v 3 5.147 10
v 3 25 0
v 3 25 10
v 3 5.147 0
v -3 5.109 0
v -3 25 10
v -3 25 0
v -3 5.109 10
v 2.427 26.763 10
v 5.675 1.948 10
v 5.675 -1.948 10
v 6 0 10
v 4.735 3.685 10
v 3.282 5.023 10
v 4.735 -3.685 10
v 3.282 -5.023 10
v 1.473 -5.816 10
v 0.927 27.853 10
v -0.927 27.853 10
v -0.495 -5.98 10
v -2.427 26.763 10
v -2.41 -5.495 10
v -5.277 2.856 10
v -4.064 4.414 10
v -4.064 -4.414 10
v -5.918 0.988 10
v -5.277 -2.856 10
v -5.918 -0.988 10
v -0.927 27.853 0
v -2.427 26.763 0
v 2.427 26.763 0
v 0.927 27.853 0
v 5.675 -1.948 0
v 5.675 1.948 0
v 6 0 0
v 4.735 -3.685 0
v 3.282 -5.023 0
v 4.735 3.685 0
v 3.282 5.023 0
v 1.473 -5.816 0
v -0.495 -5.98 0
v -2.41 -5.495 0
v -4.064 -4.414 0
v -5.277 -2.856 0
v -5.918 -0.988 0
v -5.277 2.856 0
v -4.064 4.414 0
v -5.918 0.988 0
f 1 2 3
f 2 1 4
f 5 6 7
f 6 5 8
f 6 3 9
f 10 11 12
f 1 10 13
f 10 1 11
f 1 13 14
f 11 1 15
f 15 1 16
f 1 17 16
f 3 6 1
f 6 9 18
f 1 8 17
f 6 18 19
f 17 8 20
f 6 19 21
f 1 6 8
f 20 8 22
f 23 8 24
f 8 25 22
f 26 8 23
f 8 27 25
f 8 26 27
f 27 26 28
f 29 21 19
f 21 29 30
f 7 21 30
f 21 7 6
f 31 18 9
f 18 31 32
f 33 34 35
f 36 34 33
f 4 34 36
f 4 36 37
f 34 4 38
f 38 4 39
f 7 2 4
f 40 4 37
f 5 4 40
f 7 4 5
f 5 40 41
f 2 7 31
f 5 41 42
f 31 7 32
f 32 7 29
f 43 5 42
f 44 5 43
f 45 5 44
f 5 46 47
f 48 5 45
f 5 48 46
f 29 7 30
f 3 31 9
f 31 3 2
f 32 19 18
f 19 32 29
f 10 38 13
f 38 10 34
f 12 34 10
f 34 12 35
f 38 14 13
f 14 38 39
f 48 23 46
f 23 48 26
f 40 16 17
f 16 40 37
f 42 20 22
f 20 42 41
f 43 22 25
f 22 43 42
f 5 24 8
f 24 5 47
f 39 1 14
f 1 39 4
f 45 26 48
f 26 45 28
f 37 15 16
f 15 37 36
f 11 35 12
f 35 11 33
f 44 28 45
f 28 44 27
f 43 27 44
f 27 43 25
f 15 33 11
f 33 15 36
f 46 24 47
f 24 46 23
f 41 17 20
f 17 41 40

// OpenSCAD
// Function: translate_x()
// Usage: translate_x(dist)
// Description: 
//   Translate in the X direction.  Equivalent to `translate([dist, 0, 0])`.
module translate_x(x_tr){
    translate([x_tr, 0, 0]){
        children();
    }
}

// Function: translate_y()
// Usage: translate_y(dist)
// Description: 
//   Translate in the Y direction.  Equivalent to `translate([0, dist, 0])`.
module translate_y(y_tr){
    translate([0, y_tr, 0]){
        children();
    }
}

// Function: translate_z()
// Usage: translate_z(dist)
// Description: 
//   Translate in the Z direction.  Equivalent to `translate([0, 0, dist])`.
module translate_z(z_tr){
    translate([0, 0, z_tr]){
        children();
    }
}

// Function: rotate_x()
// Usage: rotate_x(angle)
// Description: Rotate about X axis. Equivalent to `rotate([angle, 0, 0])`.
module rotate_x(x_angle){
    rotate([x_angle, 0, 0]){
        children();
    }
}

// Function: rotate_y()
// Usage: rotate_y(angle)
// Description: Rotate about Y axis. Equivalent to `rotate([0, angle, 0])`.
module rotate_y(y_angle){
    rotate([0, y_angle, 0]){
        children();
    }
}

// Function: rotate_z()
// Usage: rotate_z(angle)
// Description: Rotate about Z axis. Equivalent to `rotate([0, 0, angle])`.
module rotate_z(z_angle){
    rotate([0, 0, z_angle]){
        children();
    }
}

// Function: reflect()
// Usage: reflect(axis)
// Arguments:
//   axis = a 2- or 3D vector giving the axis to reflect in
// Description:
//   Duplicate the children of this module, once unmodified, and
//   once mirrored about the specified axis.  The mirrored copy
//   is equivalent to `mirror(axis) children()`.
//   
//   Conveninece functions `reflect_x`, `reflect_y`, and `reflect_z`
//   are defined to reflect about the respective axes.
// Examples(3D):
//   reflect([1,0,0]) translate([10,0,0]) cube(10);
//   reflect_x() translate([10,0,0]) cube(10);
module reflect(axis){
    //reflects children about the origin, keeping the originals
    children();
    mirror(axis){
        children();
    }
}


module reflect_x(){
    //shorthand for reflecting in x
    reflect([1, 0, 0]){
        children();
    }
}

module reflect_y(){
    //shorthand for reflecting in y
    reflect([0, 1, 0]){
        children();
    }
}

module reflect_z(){
    //shorthand for reflecting in z
    reflect([0, 0, 1]){
        children();
    }
}


function vector_mirror_x(vec) = _vector_mirror_axis(vec, 0);
function vector_mirror_y(vec) = _vector_mirror_axis(vec, 1);
function vector_mirror_z(vec) = _vector_mirror_axis(vec, 2);

function _vector_mirror_axis(vec, axis_index) = [
    for (i = [0:len(vec)-1])
        if (i==axis_index)
            -vec[i]
        else
            vec[i]
];

// Module: repeat()
// Usage: repeat(delta, N, center=false)
// Arguments:
//   delta = vector specifying the displacement between adjacent copies
//   N = total number of copies
//   ---
//   center = The default, `false`, places the first copy at its original location and the last is displaced by `(N-1)*delta`.  Set to `true` to centre the copies on the original location.
// Description:
//   Create a linear arry of copies of a geometry.
// Examples:
//   repeat([10,0,0], 4) cube(5);
//   repeat([10,0,0], 4, center=true) cube(5, center=true);
module repeat(delta, N, center=false){
    //repeat children along a regular array
    center_tr = (center ?  -(N-1)/2 : 0) * delta;
    translate(center_tr){
        for(i=[0:1:(N-1)]){
            translate(i*delta){
                children();
            }
        }
    }
}

module xz_slice(y=0){
    //slice out just the part of something that sits in the XZ plane
    intersection(){
        translate_y(y){
            cube([999,2*tiny(),999],center=true);
        }
        children();
    }
}

module tube(ri, ro, h, center=false){
    difference(){
        cylinder(r=ro, h=h, center=center);
        if (center){
            cylinder(r=ri, h=h+1, center=true);
        }
        else {
            translate_z(-1){
                cylinder(r=ri, h=h+2, center=false);
            }
        }
    }
}

// Module: m4_selftap_hole()
// Usage: m4_selftap_hole(h=5)
// Description:
//   Use to create a hole for an m4 machine screw to self tap into screw using a `difference()`
//   operation. This is a triangular cross-section hole.
module m4_selftap_hole(h=10, center=false){
    // r and flat calculated from the trylinder selftap function used for years.
    // Moving to explicit tested number rather than arbitary calculations.
    trylinder(r=1.3, flat=1.73, h=h, center=center);
}

// Module: no2_selftap_hole()
// Usage: no2_selftap_hole(h=5)
// Description:
//   Use to create a hole for a No2 self-tap screw using a `difference()` operation.
//   This is a triangular cross-section hole.
module no2_selftap_hole(h=10, center=false){
    //This value for r came from test prints. ranging r from 0.3 to 0.5.
    trylinder(r=.3, flat=1.73, h=h, center=center);
}

module no2_selftap_counterbore(bore_h=999, hole_h=999){
    $fn = 14;
    generic_counterbore(bore_d=5.6, bore_h=bore_h, hole_d=2.5, hole_h=hole_h);
}

// Counterbored through hole for an m3 cap screw counterbore is above z=0
// through hole is below z=0
module m3_cap_counterbore(bore_h=999, hole_h=999){
    $fn = 14;
    generic_counterbore(bore_d=6.5, bore_h=bore_h, hole_d=3.5, hole_h=hole_h);
}

module generic_counterbore(bore_d, bore_h, hole_d, hole_h){
    translate_z(-hole_h){
        cylinder(d=hole_d, h=hole_h+tiny());
    }
    cylinder(d=bore_d, h=bore_h);
}

module nut(d,h=undef,center=false,fudge=1.18,shaft=false){
    //make a nut, for metric bolt of nominal diameter d
    //d: nominal bolt diameter (e.g. 3 for M3)
    //h: height of nut
    //center: works as for cylinder
    //fudge: multiply the diameter by this number (1.22 works when vertical)
    //shaft: include a long cylinder representing the bolt shaft, diameter=d*1.05
    height = if_undefined_set_default(h, d*0.8);
    union(){
        cylinder(h=height,center=center,r=0.9*d*fudge,$fn=6);
        if(shaft){
            cylinder(r=d/2*1.05*(fudge+1)/2,h=999,$fn=16,center=true);
        }
    }
}

module nut_from_bottom(d,h=undef,fudge=1.2,shaft=true,chamfer_r=0.75,chamfer_h=0.75){
    //make a nut, for metric bolt of nominal diameter d
    //d: nominal bolt diameter (e.g. 3 for M3)
    //h: height of nut
    //center: works as for cylinder
    //fudge: multiply the diameter by this number (1.22 works when vertical)
    //shaft: include a long cylinder representing the bolt shaft, diameter=d*1.05
    height = if_undefined_set_default(h, d*0.8);
    union(){
        cylinder(h=height,r=0.9*d*fudge,$fn=6);
        translate_z(-0.05){
            cylinder(h=chamfer_h,r1=0.9*d*fudge+chamfer_r,r2=0.9*d*fudge,$fn=6);
        }
        mirror([0,0,1]){
            cylinder(h=999,r=0.9*d*fudge+chamfer_r,$fn=6);
        }
        if(shaft){
            sr=d/2*1.05*(fudge+1)/2; //radius of shaft
            translate_z(height/2){
                cylinder(r=sr,h=999,$fn=16,center=true);
            }
            //add a little cut to the roof of the surface so the initial bridges don't have to span the hole.
            intersection(){
                union(){
                    translate_z(height){
                        cube([999,sr*2,0.5],center=true);
                    }
                    translate_z(height+0.25){
                        cube([sr*2,sr*2,0.5],center=true);
                    }
                }
                cylinder(h=height+1,r=0.9*d*fudge,$fn=6);
            }
        }
    }
}

module nut_y(d,h=undef,center=false,fudge=1.15,extra_height=0.7,shaft_length=0){
    //make a nut, for metric bolt of nominal diameter d
    //d: nominal bolt diameter (e.g. 3 for M3)
    //h: height of nut
    //center: works as for cylinder
    //fudge: multiply the diameter by this number (1.22 works when vertical)
    //shaft: include a long cylinder representing the bolt shaft, diameter=d*1.05
    height = if_undefined_set_default(h, d*0.8);
    r=0.9*d*fudge;
    union(){
        rotate([-90, 0, 0]){
            cylinder(h=height,center=center,r=r,$fn=6);
        }

        if(shaft_length > 0){
            sl = shaft_length>0 ? shaft_length : 999;
            translate_y(height/2){
                reflect_y(){
                    cylinder_with_45deg_top(h=sl,r=d/2*1.05*fudge,$fn=16,extra_height=extra_height);
                }
            }
            //Center could be used instead of reflect
        }

        // extra space on top 
        center_y = center ? -height/2 : 0;
        flat_length = 2*r*sin(30);
        center_to_flat = r*cos(30);

        translate([-flat_length/2, center_y ,0]){
            cube([flat_length, height, center_to_flat+extra_height]);
        }

    }
}

// Module: cyl_slot()
// Usage: cyl_slot(r=1, h=1, dy=2, center=false)
// Description: An elongated cylinder use to make a slot for a screw. Slot is oriented in the y direction
// Arguments:
//   r = raduis of the slots
//   h = the height
//   dy = the length of the slot (centre to centre on circles) total length is dy+2*r
//   center = if true the shape is centred on all axes.
// Examples:
//   cyl_slot(r=2, h=10, dy=20);
module cyl_slot(r=1, h=1, dy=2, center=false){

    hull(){
        repeat([0, dy, 0], 2, center=true){
            cylinder(r=r, h=h, center=center);
        }
    }
}

keyhole(10, 6, 3, 25, center=false);
// Module: keyhole()
// Usage: keyhole(h, r_hole, r_slot, l_slot, center=false)
// Arguments:
//   h = height of the keyhole shape
//   r_hole = radius of the larger hole.
//   r_slot = radius of the slot.
//   l_slot = length of the slot (y-dir), from centre of hole to centre of circle at top of slot.
//   ---
//   center = The default, `false`, Whether the shape is centred in z.
// Description:
//   Create a keyhole shaped prism. Main lobe centred at (x,y) = (0,0). Slot
//   in the y-direction.
// Examples:
//   keyhole(10, 2.5, 1.6, 5, center=false);
module keyhole(h, r_hole, r_slot, l_slot, center=false){
    translate_y(l_slot/2){
        cyl_slot(r=r_slot, h=h, dy=l_slot, center=center);
    }
    cylinder(r=r_hole, h=h, center=center);
}

// Module: unrotate()
// Usage: unrotate(rotation)
// Description: 
//   Undoing a rotation is not as simple as `rotate(-rotation)` because
//   `rotate()` applies three separate rotations in order.
//   `unrotate()` reverses this, by applying the rotations in reverse order.
// Example(3D):
//   angles = [30, 60, 45];
//   unrotate(angles) rotate(angles) cylinder(r=2, h=10);
// Example(3D):
//   // This doesn't undo the rotation as you might expect!
//   angles = [30, 60, 45];
//   rotate(-angles) rotate(angles) cylinder(r=2, h=10);
module unrotate(rotation){
    //undo a previous rotation
    //Note: this is not the same as rotate(-rotation) due to ordering.
    rotate_x(-rotation.x){
        rotate_y(-rotation.y){
            rotate_z(-rotation.z){
                children();
            }
        }
    }
}

// Module: sparse_matrix_transform()
// Usage: sparse_matrix_transform(xx=1, yy=1, zz=1, xy=0, xz=0, yx=0, yz=0, zx=0, zy=0, xt=0, yt=0, zt=0)
// Description:
//   Sometimes, a matrix transformation is the right way to get something done.
//   However, specifying a full 4x4 matrix can be a bit clumsy - especially as
//   lots of useful transformations are quite close to the identity matrix.
//   This module allows you to specify individual matrix elements.  Unspecified
//   elements will default to the identity matrix.
// Examples:
//   sparse_matrix_transform(yz=0.5) cylinder(r=5, h=20);
//   sparse_matrix_transform(zy=0.5) cylinder(r=5, h=20);
module sparse_matrix_transform(xx=1, yy=1, zz=1, xy=0, xz=0, yx=0, yz=0, zx=0, zy=0, xt=0, yt=0, zt=0){
    //Apply a matrix transformation, specifying the matrix sparsely
    //This is useful because most helpful matrices are close to the identity.
    matrix = [[xx, xy, xz, xt],
              [yx, yy, yz, yt],
              [zx, zy, zz, zt],
              [0,  0,  0,  1]];
    multmatrix(matrix){
        children();
    }
}

//TODO: What does this do? Do we still want it?
module support(size, height, baseheight=0, rotation=[0,0,0], supportangle=45, outline=false){
    //generate "support material" in the STL file for selective supporting of things
    module support_2d(){
        sw=1.0;
        sp=3;
        union(){
            if(outline){
                difference()    {
                    minkowski(){
                        children();
                        circle(r=sw,$fn=8);
                    }
                    children();
                }
            }
            intersection(){
                children();
                rotate(supportangle){
                    for(x=[-size:sp:size]){
                        translate([x,0]){
                            square([sw,2*size],center=true);
                        }
                    }
                }
            }
        }
    }

    unrotate(rotation){
        translate_z(baseheight){
            linear_extrude(height){
                support_2d(){
                    projection(){
                        rotate(rotation){
                            children();
                        }
                    }
                }
            }
        }
    }
    children();
}

module rightangle_prism(size,center=false){
    intersection(){
        cube(size,center=center);
        rotate_y(45){
            translate_x(999/2){
                cube([1,1,1]*999,center=true);
            }
        }
    }
}

// Module: sequential_hull()
// Usage: sequential_hull()
// Description: 
//   Take the convex hull between each pair in a sequence of geometries.
//   
//   `sequential_hull()` allows the construction of relatively complicated
//   shapes, by "hulling" between pairs of objects.  It must have at least
//   two child modules, though it becomes useful when you have rather more.
//   Using it in conjunction with a sequence of spheres, for example, will
//   create a wire that passes each point.
// Example:
//   sequential_hull(){
//   -- $fn=8;
//       translate([0,0,0]) sphere(2);
//       translate([0,0,15]) sphere(2);
//       translate([15,0,15]) sphere(2);
//       translate([0,15,15]) sphere(2);
//   }
// Example:
//   sequential_hull(){
//       translate([0,0,0]) cylinder(r=2, h=tiny());
//       translate([0,0,5]) cylinder(r=4, h=tiny());
//       translate([0,0,7]) cylinder(r=2, h=tiny());
//       translate([0,0,10]) cylinder(r=6, h=3);
//       translate([0,0,20]) cylinder(r=2, h=tiny());
//   }
module sequential_hull(){
    //given a sequence of >2 children, take the convex hull between each pair - a helpful, general extrusion technique.
    for(i=[0:$children-2]){
        hull(){
            children(i);
            children(i+1);
        }
    }
}

module convex_fillet(r){
    offset(r){
        offset(-r){
            children();
        }
    }
}

module concave_fillet(r){
    offset(-r){
        offset(r){
            children();
        }
    }
}

//TODO: Give this a better name
module cylinder_with_45deg_top(h,r,center=false,extra_height=0.7){
    // Block on top of the hortizontal cylinder. Hulled with the cylinder
    // This forms a 45 degree sloped roof for printing
    top_block_dims = [2*sin(45/2)*r, 2*tiny(), h];
    top_block_z = center ? 0 : h/2;
    top_block_tr = [0, r-tiny(), top_block_z];
    union(){
        rotate([90,0,180]){
            hull(){
                cylinder(h=h,r=r,center=center);
                translate(top_block_tr){
                    cube(top_block_dims, center=true);
                }
            }
            translate(top_block_tr){
                cube(top_block_dims + [0, 2*extra_height, 0], center=true);
            }
        }
    }
}

//TODO: Find out if this is still needed, and what it is!
module feather_vertical_edges(flat_h=0.2,fin_r=0.5,fin_h=0.72,object_h=20){
    union(){
    //    children();
        minkowski(){
            intersection(){
                children();
                union(){
                    for(i=[-floor(object_h/fin_h):floor(object_h/fin_h)]){
                        translate_z(i*fin_h+flat_h*1.5){
                            cube([999,999,flat_h],center=true);
                        }
                    }
                }
            }
            cylinder(r1=0,r2=fin_r,h=fin_h-2*flat_h,$fn=8);
        }
    }
}

// Module: square_to_circle()
// Description:
//   Gradually transition from a square to a circle.
//
//   Create a stack of polygons, starting with a square and doubling the
//   number of sides each layer, until we end up with a "circle".
//   
//   Optionally, we can add a cylinder on top, matching the top layer.
// Arguments:
//   r = The radius of the nominal cylinder
//   h = The overall height of the structure
//   ---
//   layers = The number of layers (default is 4).  Each layer will have a height of `h/layers`
//   top_cylinder = The height of the top cylinder.  The top cylinder will have the same number of facets as the final layer, and the whole structure will have a height of `h + top_cylinder`.
module square_to_circle(r, h, layers=4, top_cylinder=0){
    // A stack of thin shapes, starting as a square and
    // gradually gaining sides to turn into a cylinder
    sides=[4,8,16,32,64,128,256]; //number of sides
    for(i=[0:(layers-1)]){
        rotate(180/sides[i]){
            translate_z(i*h/layers){
                cylinder(r=r/cos(180/sides[i]),h=h/layers+tiny(),$fn=sides[i]);
            }
        }
    }

    if(top_cylinder>0){
        translate_z(tiny()){
            cylinder(r=r,h=h+top_cylinder, $fn=sides[layers-1]);
        }
    }
}

// Module: hole_from_bottom()
// Usage: hole_from_bottom(r, h, base_w=-1, delta_z=0.5, layers=4, big_bottom=true)
// Description:
//   A cylinder that is gradually formed from a slot or square at the base.
//   This allows a hole to be formed in the "roof" of a void, with only
//   minimal "stringing" when printed with a fused filament fabrication printer.
//   
//   The most important thing to get right is the first layer, which should be
//   a slot, spanning the full width of the void.  This means that most competent
//   slicers will be able to correctly bridge across the void, parallel to the
//   slot.  You can set the width of the slot using `base_w`, though the neatest
//   way to do this is often with an intersection (see the example).
//   
//   Once you have bridged over the void, leaving a slot for the hole, the next
//   layer will have a square hole.  This should mean the printer bridges over
//   the slot in the layer(s) below, perpendicular to the edges.  Subsequent
//   layers will then fill in the corners, until we have a nice cylinder.
//   
//   You can set `base_w` carefully and just subtract this from the "roof" of
//   a void.  However, it is often easier to set `base_w=999` and 
//   `big_bottom=true`, then take the intersection with your void, see the 
//   example.
// Arguments:
//   r = The radius of the cylinder
//   h = The height of the cylinder
//   ---
//   base_w = The width of the slot at the bottom.  By default it will be 2*r.
//   delta_z = The thickness of the layers.  I suggest twice your printer's layer thickness is a sensible value.
//   layers = The number of steps between square and cylinder (default 4)
//   big_bottom = If true (default), add a very large volume below z=0
// Example(VPT=[0,0,10], VPR=[120, 0, 30], NoAxes):
//   difference(){
//        translate([-10, -10, 0]) cube(20); // The base structure
//   
//        intersection(){
//            cylinder(r=8, h=999, center=true); // This is our void
//   
//            // We set the height of our void by the Z position of 
//            // hole_from_bottom
//            translate([0,0,10]) hole_from_bottom(r=2, h=999, base_w=999, big_bottom=true);
//        }
//      
//        // Cut through the structure so we can see inside
//        rotate(225) translate([-99, 0, -1]) cube(999);
//    }
// Example(2D, NoAxes):
//    -- module example_1(){
//    --     difference(){
//    --         translate([-10, -10, 0]) cube(20); // The base structure
//    --     
//    --         intersection(){
//    --             cylinder(r=8, h=999, center=true); // This is our void
//    --     
//    --             // We set the height of our void by the Z position of 
//    --             // hole_from_bottom
//    --             translate([0,0,10]) hole_from_bottom(r=2, h=999, base_w=999, big_bottom=true);
//    --         }
//    --     }
//    -- }
//    // This code renders some slices through the first example
//    for(i = [0:3]){
//        z = 9.75 + 0.5*i;
//        translate([i*25, 0, 0]) projection(cut=true) translate([0,0,-z]) example_1();
//    }
// Example(3D, VPD=50):
//    hole_from_bottom(r=2, h=10, base_w=10, big_bottom=false);
// Example(3D, VPD=50):
//    hole_from_bottom(r=2, h=10, big_bottom=true);
// See Also: square_to_circle()
module hole_from_bottom(r, h, base_w=-1, delta_z=0.5, layers=4, big_bottom=true){
    // This creates a shape that can be used to create a 3D printable
    // hole in a large bridge. Builds up in layer to avoid unprintable
    // cantilevered paths.

    base = base_w>0 ? [base_w,2*r,2*delta_z] : [2*r,2*r,tiny()];
    union(){
        cube(base,center=true);
        translate_z(base.z/2-tiny()){
            square_to_circle(r, delta_z*4, layers, h-delta_z*5+tiny());
        }
        if(big_bottom){
            mirror([0,0,1]){
                cylinder(r=999,h=999,$fn=8);
            }
        }
    }
}

// Module: lighttrap_cylinder)
// Usage: lighttrap_cylinder(r1, r2, h, ridge=1.5);
// Arguments:
//   r1 = the radius of the bottom of the shape (i.e. the bottom of the bottom truncated cone)
//   r2 = the inner radius of the top of the shape (i.e. the top of the top truncated cone)
//   h = the overall height
//   ---
//   ridge = The height and change in `r` of each ridge (the angle is fixed at 45 degrees)
// Description:
//   A shape made up of truncated cones to form a christmas-tree-like shape.
//   
//   This is designed to be subtracted from a solid block, to form a light path
//   that has minimal reflections from the walls of the cut-out, because the 
//   surfaces are angled.
//   
//   NB for a nominally "straight-edged" cylinder, you must set `r2 = r1 - ridge`.
// Example:
//    lighttrap_cylinder(5, 5-1.5, 21);
// Example:
//    difference(){
//        translate([-10, -10, 0]) cube(20);
//        lighttrap_cylinder(5, 5-1.5, 21);
//        translate([-99, -999, -1]) cube(999);
//    }
module lighttrap_cylinder(r1,r2,h,ridge=1.5){
    //there must be at least one cone or we divide by zero
    n_cones = max(floor(h/ridge),1);
    cone_h = h/n_cones;

    for(i = [0 : n_cones - 1]){
        p = i/(n_cones - 1);
        section_r1 = (1-p)*r1 + p*(r2+ridge);
        section_r2 = (1-p)*(r1-ridge) + p*r2;
        translate_z(i * cone_h - tiny()){
            cylinder(r1=section_r1, r2=section_r2, h=cone_h+2*tiny());
        }
    }
}

module lighttrap_sqylinder(r1,f1,r2,f2,h,ridge=1.5){
    //A shape made up of rounded truncated pyramids to form a
    //square christmas-tree-like shape.
    //Similar to lighttrap_cylinder each section has flat sides
    //It can be subtracted from and object to create a square shaft that is
    //good for trapping stray light in an optical path. The shaft rounded
    //corners
    //r1 is radius of cuvature of the bottom of the bottom pyramid
    //f1 is the flat section of the bottom of the bottom pyramid
    //r2 is radius of cuvature of the top of the top pyramid
    //f2 is the flat section of the to of the top pyramid
    //NOTE: to make a uniform width shaft set r2==r1-ridge and f1=f2
    //ALSO NOTE: Each truncated pyramid is made by varying r, not f. As such
    //    r1 must be greater than or equal to ridge

    assert(r1>=ridge, "r1 is less than ridge this will cause the light trap to fail");
    //there must be at least one cone or we divide by zero
    n_cones = max(floor(h/ridge),1);
    cone_h = h/n_cones;

    for(i = [0 : n_cones - 1]){
        p = i/(n_cones - 1);
        section_r1 = (1-p)*r1 + p*(r2+ridge);
        section_r2 = (1-p)*(r1-ridge) + p*r2;
        section_flat_l = ((1-p)*f1 + p*f2);
        translate_z(i * cone_h - tiny()){
            minkowski(){
                cylinder(r1=section_r1, r2=section_r2, h=cone_h);
                cube([section_flat_l, section_flat_l, 2*tiny()], center=true);
            }
        }
    }
}

module trylinder(r=1, flat=1, h=tiny(), center=false){
    //Triangular prism with filleted corners
    //NOTE the largest cylinder that fits inside it has r=r+f/(2*sqrt(3))
    //One of the sides is parallel with the X axis
    hull(){
        for(a=[0,120,240]){
            rotate(a){
                translate_y(flat/sqrt(3)){
                    cylinder(r=r, h=h, center=center);
                }
            }
        }
    }
}

module trylinder_selftap(nominal_d=3, h=10, center=false){
    // Make a trylinder that you can self-tap a machine screw into.
    // The size is deliberately a bit big for small holes, so that
    // it compensates for splodgy printing
    echo("Warning: `trylinder_selftap` is no longer recommended for use.");
    echo("Use explicitlt defined holes such as `m4_selftap_hole` for screw sizes M4 and above.");
    echo("Use explicit holes for self tap screws, such as `no2_selftap_hole`");
    echo("For machine screws smaller than M4 use nut traps to avoid thread stripping.");
    r = max(nominal_d*0.8/2 + 0.2, nominal_d/2 - 0.2);
    dr = 0.5;
    flat = dr * 2 * sqrt(3);
    trylinder(r=r - dr, flat=flat, h=h, center=center);
}


module trylinder_gripper(inner_r=10,h=6,grip_h=3.5,base_r=-1,t=0.65,squeeze=1,flare=0.8,solid=false){
    // This creates a tapering, distorted hollow cylinder suitable for
    // gripping a small cylindrical (or spherical) object
    // The gripping occurs grip_h above the base, and it flares out
    // again both above and below this.
    // inner_r: radius of the cylinder we're gripping
    // h: overall height of the gripper
    // grip_h: height of the part where the gripper touches the cylinder
    // base_r: radius of the (cylindrical) bottom
    // t: thickness of the walls
    // squeeze: how far the wall must be distorted to fit the cylinder
    // flare: how much larger the top is than the gripping part
    // solid: if true, make a solid outline of the gripper
    $fn=48;
    bottom_r=base_r>0?base_r:inner_r+1+t;

    //TODO: reduce repition
    difference(){
        sequential_hull(){
            cylinder(r=bottom_r,h=tiny());
            translate_z(grip_h-0.5){
                trylinder(r=inner_r-squeeze+t,flat=2.5*squeeze,h=tiny());
            }
            translate_z(grip_h+0.5){
                trylinder(r=inner_r-squeeze+t,flat=2.5*squeeze,h=tiny());
            }
            translate_z(h-tiny()){
                trylinder(r=inner_r-squeeze+flare+t,flat=2.5*squeeze,h=tiny());
            }
        }
        if(solid==false){
            sequential_hull(){
                translate_z(-tiny()){
                    cylinder(r=bottom_r-t,h=tiny());
                }
                translate_z(grip_h-0.5){
                    trylinder(r=inner_r-squeeze,flat=2.5*squeeze,h=tiny());
                }
                translate_z(grip_h+0.5){
                    trylinder(r=inner_r-squeeze,flat=2.5*squeeze,h=tiny());
                }
                translate_z(h){
                    trylinder(r=inner_r-squeeze+flare,flat=2.5*squeeze,h=tiny());
                }
            }
        }
    }
}

module deformable_hole_trylinder(r1, r2, h=99, corner_roc=undef, delta_z=0.5, center=false){
    // A cylinder with feathered edges, to make a hole that is
    // slightly deformable, in an otherwise rigid structure.
    // r1: inner radius
    // r2: outer radius
    // h, center: as for cylinder
    // corner_roc: radius of curvature of the trylinder
    // delta_z: thickness of layers
    n = floor(h/(2*delta_z)); //number of layers in the structure
    flat_l = 2*sqrt(r2*r2 - r1*r1);
    default_corner_radius = r1 - flat_l/(2*sqrt(3));
    corner_radius = if_undefined_set_default(corner_roc, default_corner_radius);
    repeat([0,0,2*delta_z], n, center=center){
        union(){
            cylinder(r=r2, h=delta_z+tiny());
            translate_z(center ? -delta_z : delta_z){
                trylinder(r=corner_radius, flat=flat_l, h=delta_z+tiny());
            }
        }
    }
}


module exterior_brim(r=4, h=0.2, brim_only=false, smooth_r=undef){
    // Add a "brim" around the outside of an object *only*, preserving holes in the object
    // brim width r and the smoothing smooth_r can be defined separately, but default to equal

    _smooth_r = is_undef(smooth_r) ? r : smooth_r;

    if (!brim_only){
        children();
    }

    if(r > 0){
        linear_extrude(h){
            difference(){
                offset(r){
                    offset(-_smooth_r){
                        offset(_smooth_r){
                            projection(cut=true){
                                translate_z(-tiny()){
                                    children();
                                }
                            }
                        }
                    }
                }
                offset(-_smooth_r+tiny()){
                    offset(_smooth_r){
                        projection(cut=true){
                            translate_z(-tiny()){
                                children();
                            }
                        }
                    }
                }
            }
        }
    }
}

module external_fillet_2d(r=3)
{
    offset(r=r){
        offset(r=-r){
            children();
        }
    }
}

module internal_fillet_2d(r=3)
{
    offset(r=-r){
        offset(r=r){
            children();
        }
    }
}

module fillet_2d(r=3)
{
    external_fillet_2d(r=r){
        internal_fillet_2d(r=r){
            children();
        }
    }
}
